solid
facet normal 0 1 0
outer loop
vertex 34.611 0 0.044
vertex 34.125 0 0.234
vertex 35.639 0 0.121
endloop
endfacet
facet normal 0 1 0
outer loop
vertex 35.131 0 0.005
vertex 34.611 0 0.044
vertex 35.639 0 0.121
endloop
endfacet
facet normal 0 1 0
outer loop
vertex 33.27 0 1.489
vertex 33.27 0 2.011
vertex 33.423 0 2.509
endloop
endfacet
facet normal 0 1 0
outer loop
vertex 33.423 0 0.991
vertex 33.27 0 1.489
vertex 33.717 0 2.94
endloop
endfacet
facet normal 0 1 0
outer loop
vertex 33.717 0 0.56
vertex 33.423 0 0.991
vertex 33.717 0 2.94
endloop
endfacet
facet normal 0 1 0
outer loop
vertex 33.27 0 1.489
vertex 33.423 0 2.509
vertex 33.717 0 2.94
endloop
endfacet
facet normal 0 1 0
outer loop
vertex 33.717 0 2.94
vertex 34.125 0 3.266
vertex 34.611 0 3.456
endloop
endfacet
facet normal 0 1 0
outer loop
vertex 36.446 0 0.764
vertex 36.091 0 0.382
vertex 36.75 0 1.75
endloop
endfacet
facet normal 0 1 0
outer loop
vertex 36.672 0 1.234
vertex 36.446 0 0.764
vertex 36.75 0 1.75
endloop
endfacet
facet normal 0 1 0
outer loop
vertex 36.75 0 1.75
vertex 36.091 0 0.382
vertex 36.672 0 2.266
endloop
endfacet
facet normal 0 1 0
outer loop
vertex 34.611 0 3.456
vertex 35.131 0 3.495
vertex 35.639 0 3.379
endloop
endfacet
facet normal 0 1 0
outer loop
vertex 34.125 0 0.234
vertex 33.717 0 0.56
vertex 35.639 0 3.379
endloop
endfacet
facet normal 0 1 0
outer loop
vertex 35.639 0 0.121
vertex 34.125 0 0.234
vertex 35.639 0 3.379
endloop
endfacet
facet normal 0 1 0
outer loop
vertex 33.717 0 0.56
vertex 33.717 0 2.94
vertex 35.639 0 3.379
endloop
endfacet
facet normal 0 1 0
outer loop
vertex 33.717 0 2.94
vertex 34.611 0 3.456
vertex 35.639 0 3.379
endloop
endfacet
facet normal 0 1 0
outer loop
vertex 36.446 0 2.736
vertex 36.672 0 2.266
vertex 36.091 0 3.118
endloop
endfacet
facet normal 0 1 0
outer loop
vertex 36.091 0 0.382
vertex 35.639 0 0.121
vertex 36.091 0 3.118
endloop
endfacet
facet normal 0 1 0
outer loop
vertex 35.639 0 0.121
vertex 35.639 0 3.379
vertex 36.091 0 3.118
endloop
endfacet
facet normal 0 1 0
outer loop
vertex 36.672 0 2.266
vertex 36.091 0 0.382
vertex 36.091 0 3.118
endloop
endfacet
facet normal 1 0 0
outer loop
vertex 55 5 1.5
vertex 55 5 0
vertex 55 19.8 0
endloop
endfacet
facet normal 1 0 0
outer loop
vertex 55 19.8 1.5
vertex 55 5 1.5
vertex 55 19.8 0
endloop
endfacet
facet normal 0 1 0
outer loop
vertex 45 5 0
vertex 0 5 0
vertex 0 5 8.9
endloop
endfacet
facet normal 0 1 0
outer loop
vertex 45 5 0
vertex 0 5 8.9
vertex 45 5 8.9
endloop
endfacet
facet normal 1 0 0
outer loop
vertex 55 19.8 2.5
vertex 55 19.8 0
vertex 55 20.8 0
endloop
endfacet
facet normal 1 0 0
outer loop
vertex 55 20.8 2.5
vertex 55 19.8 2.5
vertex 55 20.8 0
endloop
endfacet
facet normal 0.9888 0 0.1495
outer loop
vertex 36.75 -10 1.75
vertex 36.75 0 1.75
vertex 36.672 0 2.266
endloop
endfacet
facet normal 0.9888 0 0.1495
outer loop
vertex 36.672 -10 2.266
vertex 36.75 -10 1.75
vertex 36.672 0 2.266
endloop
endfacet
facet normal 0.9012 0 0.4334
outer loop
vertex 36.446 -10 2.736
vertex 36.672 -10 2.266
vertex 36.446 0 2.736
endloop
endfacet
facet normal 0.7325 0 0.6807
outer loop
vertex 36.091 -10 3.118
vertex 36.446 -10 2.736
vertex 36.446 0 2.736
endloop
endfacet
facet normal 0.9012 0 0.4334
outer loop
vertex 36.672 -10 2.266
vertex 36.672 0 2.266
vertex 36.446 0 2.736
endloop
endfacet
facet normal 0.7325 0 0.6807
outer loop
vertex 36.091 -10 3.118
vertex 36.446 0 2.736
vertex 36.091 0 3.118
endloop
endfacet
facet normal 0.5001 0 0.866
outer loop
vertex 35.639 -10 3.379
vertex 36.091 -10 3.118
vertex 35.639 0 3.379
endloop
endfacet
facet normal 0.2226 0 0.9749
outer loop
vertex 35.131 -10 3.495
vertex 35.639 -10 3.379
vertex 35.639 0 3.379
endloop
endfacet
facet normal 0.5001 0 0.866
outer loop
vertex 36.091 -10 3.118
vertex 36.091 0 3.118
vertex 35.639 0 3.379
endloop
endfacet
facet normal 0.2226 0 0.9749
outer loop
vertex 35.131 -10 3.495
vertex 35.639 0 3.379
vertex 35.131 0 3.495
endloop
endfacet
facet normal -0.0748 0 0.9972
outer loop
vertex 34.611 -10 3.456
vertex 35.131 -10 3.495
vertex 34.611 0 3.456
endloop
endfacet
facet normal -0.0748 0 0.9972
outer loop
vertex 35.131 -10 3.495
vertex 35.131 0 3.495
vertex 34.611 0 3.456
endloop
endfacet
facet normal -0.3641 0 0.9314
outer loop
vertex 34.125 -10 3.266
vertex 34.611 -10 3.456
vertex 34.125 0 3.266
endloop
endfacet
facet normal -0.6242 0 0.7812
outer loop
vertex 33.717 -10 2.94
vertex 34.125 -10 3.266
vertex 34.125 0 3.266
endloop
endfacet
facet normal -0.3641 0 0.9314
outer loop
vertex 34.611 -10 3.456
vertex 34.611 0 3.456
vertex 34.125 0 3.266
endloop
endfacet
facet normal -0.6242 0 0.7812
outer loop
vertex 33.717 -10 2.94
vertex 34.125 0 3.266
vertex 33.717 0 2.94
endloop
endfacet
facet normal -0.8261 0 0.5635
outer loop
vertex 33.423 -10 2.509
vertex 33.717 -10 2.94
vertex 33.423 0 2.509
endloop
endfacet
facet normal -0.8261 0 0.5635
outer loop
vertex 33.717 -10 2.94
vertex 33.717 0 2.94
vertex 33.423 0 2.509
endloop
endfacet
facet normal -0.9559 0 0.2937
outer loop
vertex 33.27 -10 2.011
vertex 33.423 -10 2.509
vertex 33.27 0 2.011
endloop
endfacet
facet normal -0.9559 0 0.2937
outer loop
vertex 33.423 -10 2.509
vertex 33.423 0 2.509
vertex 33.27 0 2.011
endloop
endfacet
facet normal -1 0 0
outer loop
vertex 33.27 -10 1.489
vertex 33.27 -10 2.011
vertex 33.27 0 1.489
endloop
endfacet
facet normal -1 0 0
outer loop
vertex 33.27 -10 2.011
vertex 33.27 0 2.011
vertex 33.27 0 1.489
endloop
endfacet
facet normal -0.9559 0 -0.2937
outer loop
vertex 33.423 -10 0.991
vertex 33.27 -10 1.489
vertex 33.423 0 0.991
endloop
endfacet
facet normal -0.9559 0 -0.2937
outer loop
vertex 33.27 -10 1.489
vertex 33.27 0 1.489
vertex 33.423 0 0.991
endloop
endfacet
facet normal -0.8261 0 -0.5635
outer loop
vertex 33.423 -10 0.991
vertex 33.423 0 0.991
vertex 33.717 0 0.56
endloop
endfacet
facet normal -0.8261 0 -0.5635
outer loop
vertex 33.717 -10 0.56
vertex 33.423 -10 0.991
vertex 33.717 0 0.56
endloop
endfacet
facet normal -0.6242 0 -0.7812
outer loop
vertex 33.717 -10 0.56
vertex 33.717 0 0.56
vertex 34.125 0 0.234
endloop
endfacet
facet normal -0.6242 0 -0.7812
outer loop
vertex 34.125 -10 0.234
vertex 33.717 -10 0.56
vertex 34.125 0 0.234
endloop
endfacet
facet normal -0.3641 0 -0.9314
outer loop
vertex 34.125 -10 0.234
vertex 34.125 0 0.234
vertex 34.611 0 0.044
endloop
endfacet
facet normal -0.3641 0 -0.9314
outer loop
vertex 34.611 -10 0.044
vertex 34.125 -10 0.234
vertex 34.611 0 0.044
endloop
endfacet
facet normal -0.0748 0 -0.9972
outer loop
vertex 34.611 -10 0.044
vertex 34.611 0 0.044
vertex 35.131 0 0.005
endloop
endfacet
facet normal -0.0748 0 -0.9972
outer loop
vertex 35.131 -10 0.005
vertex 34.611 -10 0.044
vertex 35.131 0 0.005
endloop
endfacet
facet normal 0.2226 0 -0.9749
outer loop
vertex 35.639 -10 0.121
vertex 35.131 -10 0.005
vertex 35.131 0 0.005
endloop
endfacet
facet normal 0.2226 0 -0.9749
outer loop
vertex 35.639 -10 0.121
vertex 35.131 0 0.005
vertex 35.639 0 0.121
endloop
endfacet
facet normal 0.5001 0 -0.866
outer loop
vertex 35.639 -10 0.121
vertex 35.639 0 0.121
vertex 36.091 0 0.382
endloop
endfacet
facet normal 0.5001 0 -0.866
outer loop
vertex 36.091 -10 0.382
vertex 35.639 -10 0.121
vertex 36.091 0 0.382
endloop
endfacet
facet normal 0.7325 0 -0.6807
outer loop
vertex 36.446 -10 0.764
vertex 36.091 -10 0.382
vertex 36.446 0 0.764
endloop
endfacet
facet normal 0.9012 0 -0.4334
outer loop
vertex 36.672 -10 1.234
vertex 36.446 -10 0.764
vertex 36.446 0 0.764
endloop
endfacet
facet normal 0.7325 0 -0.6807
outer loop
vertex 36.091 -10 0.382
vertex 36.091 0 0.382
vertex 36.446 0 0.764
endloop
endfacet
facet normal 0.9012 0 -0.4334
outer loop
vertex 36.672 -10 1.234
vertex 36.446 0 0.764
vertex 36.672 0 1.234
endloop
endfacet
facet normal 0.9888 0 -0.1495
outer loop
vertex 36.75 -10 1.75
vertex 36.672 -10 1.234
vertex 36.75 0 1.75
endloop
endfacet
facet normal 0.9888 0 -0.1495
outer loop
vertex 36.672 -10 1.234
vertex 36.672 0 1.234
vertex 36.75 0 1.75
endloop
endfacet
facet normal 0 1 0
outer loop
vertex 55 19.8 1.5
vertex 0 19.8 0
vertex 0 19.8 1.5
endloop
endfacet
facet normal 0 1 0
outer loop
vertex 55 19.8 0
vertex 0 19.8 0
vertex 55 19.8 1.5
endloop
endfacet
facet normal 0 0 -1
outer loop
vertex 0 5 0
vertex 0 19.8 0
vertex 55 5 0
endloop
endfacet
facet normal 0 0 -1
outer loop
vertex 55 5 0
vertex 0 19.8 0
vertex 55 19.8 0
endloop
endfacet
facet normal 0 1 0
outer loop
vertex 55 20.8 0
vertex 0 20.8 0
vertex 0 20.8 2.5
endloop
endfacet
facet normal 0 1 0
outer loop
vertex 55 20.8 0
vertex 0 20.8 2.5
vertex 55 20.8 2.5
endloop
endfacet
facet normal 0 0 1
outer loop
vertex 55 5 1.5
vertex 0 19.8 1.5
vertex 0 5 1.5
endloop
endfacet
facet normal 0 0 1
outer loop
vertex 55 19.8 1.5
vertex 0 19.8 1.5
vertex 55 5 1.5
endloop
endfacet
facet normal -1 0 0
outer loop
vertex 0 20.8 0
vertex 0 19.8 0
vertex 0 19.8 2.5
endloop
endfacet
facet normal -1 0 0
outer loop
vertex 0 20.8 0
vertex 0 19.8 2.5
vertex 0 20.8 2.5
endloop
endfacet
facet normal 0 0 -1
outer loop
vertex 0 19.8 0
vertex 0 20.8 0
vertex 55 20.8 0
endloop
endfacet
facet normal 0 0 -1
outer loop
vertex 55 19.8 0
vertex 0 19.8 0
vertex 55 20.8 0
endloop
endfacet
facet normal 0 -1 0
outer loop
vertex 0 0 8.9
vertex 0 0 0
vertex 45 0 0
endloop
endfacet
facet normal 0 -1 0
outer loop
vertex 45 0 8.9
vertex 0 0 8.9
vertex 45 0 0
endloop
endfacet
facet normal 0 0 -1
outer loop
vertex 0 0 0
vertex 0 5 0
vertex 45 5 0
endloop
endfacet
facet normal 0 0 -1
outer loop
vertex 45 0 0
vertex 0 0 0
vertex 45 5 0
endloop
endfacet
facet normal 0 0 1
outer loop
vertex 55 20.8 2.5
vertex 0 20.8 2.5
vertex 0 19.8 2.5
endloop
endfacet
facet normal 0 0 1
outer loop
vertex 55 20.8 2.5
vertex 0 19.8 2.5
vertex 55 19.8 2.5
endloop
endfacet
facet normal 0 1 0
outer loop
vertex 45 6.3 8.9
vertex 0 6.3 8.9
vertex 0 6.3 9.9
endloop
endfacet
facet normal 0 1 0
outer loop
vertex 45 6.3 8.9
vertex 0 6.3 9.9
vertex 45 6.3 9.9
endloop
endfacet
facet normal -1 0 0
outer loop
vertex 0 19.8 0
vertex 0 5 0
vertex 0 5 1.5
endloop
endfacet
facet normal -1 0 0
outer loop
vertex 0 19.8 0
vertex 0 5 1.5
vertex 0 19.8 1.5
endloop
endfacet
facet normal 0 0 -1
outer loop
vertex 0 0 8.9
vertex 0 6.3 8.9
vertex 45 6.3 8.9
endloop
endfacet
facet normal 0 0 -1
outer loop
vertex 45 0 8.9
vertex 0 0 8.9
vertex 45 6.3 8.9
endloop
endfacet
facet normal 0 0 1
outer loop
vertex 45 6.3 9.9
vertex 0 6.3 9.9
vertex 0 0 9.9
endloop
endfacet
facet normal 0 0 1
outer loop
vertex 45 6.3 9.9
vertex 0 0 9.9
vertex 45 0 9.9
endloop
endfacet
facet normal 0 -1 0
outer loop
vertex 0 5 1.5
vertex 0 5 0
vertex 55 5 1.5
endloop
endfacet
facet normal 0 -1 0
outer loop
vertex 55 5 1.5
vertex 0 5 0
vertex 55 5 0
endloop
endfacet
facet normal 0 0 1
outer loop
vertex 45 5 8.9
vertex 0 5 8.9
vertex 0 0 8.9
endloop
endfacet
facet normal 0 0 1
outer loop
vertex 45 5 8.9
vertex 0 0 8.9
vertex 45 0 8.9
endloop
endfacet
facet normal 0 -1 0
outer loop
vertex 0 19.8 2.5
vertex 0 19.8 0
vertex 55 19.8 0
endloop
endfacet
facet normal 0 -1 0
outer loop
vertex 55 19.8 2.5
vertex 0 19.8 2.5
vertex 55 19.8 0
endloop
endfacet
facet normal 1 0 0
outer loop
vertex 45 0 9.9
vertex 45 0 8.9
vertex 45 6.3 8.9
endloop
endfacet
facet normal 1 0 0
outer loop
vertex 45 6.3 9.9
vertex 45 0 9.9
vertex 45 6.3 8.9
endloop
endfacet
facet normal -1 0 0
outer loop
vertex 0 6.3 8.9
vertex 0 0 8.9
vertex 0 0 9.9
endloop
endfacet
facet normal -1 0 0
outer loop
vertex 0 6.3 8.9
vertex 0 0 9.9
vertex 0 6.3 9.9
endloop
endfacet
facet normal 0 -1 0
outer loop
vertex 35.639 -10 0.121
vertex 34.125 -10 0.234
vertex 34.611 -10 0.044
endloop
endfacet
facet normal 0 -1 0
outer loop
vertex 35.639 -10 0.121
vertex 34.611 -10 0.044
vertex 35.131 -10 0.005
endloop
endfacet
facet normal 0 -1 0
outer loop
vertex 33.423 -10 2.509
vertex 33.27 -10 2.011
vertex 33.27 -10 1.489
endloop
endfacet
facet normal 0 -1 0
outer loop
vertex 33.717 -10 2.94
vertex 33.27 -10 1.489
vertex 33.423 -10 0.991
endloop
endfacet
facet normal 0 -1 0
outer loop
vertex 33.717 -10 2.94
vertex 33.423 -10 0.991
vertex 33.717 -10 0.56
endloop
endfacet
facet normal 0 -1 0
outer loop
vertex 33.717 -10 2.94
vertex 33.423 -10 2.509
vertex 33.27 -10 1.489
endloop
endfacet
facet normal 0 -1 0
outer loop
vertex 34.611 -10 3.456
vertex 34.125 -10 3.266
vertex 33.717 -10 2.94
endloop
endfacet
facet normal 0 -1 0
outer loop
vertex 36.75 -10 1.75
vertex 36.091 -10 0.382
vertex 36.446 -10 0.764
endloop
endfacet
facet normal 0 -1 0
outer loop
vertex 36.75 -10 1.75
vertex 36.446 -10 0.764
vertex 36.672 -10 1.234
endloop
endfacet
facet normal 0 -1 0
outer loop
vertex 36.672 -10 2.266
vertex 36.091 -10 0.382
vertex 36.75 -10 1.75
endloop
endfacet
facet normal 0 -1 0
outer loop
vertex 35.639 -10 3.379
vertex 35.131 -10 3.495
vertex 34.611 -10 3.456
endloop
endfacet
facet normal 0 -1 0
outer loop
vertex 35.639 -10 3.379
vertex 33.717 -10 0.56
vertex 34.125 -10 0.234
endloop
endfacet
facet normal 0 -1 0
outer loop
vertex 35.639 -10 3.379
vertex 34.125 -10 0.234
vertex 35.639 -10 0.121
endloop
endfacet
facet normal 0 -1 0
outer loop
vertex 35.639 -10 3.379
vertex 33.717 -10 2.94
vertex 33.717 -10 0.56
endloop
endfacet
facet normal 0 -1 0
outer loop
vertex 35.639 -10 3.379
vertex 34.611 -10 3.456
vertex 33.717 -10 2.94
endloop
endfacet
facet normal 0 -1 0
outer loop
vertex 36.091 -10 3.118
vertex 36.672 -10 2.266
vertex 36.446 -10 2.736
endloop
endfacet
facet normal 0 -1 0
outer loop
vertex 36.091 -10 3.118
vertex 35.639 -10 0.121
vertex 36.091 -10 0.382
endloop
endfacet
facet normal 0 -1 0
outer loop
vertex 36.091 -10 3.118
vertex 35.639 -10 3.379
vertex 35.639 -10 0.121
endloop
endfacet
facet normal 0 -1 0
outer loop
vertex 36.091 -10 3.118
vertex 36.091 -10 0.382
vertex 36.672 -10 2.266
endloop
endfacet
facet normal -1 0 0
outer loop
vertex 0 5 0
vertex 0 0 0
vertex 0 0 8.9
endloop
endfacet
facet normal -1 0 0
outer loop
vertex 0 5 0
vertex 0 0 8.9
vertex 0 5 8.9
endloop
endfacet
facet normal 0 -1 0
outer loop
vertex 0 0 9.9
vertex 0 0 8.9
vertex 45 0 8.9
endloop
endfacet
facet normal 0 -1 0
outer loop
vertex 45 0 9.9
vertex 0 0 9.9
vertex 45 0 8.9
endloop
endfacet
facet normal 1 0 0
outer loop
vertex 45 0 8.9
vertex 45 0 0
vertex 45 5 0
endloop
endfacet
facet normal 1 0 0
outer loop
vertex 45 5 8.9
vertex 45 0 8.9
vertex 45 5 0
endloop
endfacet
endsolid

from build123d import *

# Parameters (mm, degrees)
BOX_W          = 45
BOX_H          = 5
BOX_DEPTH      = 8.9
BOX001_W       = 55
BOX001_H       = 14.8
BOX001_DEPTH   = 1.5
BOX002_W       = 55
BOX002_H       = 1
BOX002_DEPTH   = 2.5
BOX003_W       = 45
BOX003_H       = 6.3
BOX003_DEPTH   = 1
CYLINDER_R     = 1.75
CYLINDER_DEPTH = 10


with BuildPart() as cube:
    # Box → Box (new body)
    with BuildSketch(Plane.XY):
        with Locations((22.5, 2.5)):
            Rectangle(BOX_W, BOX_H)
    extrude(amount=BOX_DEPTH)


with BuildPart() as cube001:
    # Box001 → Box001 (new body)
    with BuildSketch(Plane(origin=(0, 5, 0), x_dir=(1, 0, 0), z_dir=(0, 0, 1))):
        with Locations((27.5, 7.4)):
            Rectangle(BOX001_W, BOX001_H)
    extrude(amount=BOX001_DEPTH)


with BuildPart() as cube002:
    # Box002 → Box002 (new body)
    with BuildSketch(Plane(origin=(0, 19.8, 0), x_dir=(1, 0, 0), z_dir=(0, 0, 1))):
        with Locations((27.5, 0.5)):
            Rectangle(BOX002_W, BOX002_H)
    extrude(amount=BOX002_DEPTH)


with BuildPart() as cube003:
    # Box003 → Box003 (new body)
    with BuildSketch(Plane.XY.offset(8.9)):
        with Locations((22.5, 3.15)):
            Rectangle(BOX003_W, BOX003_H)
    extrude(amount=BOX003_DEPTH)


with BuildPart() as cylinder:
    # Cylinder → Cylinder (new body)
    with BuildSketch(Plane(origin=(35, 0, 1.75), x_dir=(1, 0, 0), z_dir=(0, -1, 0))):
        Circle(CYLINDER_R)
    extrude(amount=CYLINDER_DEPTH)


solid = Compound([cube.part, cube001.part, cube002.part, cube003.part, cylinder.part])
